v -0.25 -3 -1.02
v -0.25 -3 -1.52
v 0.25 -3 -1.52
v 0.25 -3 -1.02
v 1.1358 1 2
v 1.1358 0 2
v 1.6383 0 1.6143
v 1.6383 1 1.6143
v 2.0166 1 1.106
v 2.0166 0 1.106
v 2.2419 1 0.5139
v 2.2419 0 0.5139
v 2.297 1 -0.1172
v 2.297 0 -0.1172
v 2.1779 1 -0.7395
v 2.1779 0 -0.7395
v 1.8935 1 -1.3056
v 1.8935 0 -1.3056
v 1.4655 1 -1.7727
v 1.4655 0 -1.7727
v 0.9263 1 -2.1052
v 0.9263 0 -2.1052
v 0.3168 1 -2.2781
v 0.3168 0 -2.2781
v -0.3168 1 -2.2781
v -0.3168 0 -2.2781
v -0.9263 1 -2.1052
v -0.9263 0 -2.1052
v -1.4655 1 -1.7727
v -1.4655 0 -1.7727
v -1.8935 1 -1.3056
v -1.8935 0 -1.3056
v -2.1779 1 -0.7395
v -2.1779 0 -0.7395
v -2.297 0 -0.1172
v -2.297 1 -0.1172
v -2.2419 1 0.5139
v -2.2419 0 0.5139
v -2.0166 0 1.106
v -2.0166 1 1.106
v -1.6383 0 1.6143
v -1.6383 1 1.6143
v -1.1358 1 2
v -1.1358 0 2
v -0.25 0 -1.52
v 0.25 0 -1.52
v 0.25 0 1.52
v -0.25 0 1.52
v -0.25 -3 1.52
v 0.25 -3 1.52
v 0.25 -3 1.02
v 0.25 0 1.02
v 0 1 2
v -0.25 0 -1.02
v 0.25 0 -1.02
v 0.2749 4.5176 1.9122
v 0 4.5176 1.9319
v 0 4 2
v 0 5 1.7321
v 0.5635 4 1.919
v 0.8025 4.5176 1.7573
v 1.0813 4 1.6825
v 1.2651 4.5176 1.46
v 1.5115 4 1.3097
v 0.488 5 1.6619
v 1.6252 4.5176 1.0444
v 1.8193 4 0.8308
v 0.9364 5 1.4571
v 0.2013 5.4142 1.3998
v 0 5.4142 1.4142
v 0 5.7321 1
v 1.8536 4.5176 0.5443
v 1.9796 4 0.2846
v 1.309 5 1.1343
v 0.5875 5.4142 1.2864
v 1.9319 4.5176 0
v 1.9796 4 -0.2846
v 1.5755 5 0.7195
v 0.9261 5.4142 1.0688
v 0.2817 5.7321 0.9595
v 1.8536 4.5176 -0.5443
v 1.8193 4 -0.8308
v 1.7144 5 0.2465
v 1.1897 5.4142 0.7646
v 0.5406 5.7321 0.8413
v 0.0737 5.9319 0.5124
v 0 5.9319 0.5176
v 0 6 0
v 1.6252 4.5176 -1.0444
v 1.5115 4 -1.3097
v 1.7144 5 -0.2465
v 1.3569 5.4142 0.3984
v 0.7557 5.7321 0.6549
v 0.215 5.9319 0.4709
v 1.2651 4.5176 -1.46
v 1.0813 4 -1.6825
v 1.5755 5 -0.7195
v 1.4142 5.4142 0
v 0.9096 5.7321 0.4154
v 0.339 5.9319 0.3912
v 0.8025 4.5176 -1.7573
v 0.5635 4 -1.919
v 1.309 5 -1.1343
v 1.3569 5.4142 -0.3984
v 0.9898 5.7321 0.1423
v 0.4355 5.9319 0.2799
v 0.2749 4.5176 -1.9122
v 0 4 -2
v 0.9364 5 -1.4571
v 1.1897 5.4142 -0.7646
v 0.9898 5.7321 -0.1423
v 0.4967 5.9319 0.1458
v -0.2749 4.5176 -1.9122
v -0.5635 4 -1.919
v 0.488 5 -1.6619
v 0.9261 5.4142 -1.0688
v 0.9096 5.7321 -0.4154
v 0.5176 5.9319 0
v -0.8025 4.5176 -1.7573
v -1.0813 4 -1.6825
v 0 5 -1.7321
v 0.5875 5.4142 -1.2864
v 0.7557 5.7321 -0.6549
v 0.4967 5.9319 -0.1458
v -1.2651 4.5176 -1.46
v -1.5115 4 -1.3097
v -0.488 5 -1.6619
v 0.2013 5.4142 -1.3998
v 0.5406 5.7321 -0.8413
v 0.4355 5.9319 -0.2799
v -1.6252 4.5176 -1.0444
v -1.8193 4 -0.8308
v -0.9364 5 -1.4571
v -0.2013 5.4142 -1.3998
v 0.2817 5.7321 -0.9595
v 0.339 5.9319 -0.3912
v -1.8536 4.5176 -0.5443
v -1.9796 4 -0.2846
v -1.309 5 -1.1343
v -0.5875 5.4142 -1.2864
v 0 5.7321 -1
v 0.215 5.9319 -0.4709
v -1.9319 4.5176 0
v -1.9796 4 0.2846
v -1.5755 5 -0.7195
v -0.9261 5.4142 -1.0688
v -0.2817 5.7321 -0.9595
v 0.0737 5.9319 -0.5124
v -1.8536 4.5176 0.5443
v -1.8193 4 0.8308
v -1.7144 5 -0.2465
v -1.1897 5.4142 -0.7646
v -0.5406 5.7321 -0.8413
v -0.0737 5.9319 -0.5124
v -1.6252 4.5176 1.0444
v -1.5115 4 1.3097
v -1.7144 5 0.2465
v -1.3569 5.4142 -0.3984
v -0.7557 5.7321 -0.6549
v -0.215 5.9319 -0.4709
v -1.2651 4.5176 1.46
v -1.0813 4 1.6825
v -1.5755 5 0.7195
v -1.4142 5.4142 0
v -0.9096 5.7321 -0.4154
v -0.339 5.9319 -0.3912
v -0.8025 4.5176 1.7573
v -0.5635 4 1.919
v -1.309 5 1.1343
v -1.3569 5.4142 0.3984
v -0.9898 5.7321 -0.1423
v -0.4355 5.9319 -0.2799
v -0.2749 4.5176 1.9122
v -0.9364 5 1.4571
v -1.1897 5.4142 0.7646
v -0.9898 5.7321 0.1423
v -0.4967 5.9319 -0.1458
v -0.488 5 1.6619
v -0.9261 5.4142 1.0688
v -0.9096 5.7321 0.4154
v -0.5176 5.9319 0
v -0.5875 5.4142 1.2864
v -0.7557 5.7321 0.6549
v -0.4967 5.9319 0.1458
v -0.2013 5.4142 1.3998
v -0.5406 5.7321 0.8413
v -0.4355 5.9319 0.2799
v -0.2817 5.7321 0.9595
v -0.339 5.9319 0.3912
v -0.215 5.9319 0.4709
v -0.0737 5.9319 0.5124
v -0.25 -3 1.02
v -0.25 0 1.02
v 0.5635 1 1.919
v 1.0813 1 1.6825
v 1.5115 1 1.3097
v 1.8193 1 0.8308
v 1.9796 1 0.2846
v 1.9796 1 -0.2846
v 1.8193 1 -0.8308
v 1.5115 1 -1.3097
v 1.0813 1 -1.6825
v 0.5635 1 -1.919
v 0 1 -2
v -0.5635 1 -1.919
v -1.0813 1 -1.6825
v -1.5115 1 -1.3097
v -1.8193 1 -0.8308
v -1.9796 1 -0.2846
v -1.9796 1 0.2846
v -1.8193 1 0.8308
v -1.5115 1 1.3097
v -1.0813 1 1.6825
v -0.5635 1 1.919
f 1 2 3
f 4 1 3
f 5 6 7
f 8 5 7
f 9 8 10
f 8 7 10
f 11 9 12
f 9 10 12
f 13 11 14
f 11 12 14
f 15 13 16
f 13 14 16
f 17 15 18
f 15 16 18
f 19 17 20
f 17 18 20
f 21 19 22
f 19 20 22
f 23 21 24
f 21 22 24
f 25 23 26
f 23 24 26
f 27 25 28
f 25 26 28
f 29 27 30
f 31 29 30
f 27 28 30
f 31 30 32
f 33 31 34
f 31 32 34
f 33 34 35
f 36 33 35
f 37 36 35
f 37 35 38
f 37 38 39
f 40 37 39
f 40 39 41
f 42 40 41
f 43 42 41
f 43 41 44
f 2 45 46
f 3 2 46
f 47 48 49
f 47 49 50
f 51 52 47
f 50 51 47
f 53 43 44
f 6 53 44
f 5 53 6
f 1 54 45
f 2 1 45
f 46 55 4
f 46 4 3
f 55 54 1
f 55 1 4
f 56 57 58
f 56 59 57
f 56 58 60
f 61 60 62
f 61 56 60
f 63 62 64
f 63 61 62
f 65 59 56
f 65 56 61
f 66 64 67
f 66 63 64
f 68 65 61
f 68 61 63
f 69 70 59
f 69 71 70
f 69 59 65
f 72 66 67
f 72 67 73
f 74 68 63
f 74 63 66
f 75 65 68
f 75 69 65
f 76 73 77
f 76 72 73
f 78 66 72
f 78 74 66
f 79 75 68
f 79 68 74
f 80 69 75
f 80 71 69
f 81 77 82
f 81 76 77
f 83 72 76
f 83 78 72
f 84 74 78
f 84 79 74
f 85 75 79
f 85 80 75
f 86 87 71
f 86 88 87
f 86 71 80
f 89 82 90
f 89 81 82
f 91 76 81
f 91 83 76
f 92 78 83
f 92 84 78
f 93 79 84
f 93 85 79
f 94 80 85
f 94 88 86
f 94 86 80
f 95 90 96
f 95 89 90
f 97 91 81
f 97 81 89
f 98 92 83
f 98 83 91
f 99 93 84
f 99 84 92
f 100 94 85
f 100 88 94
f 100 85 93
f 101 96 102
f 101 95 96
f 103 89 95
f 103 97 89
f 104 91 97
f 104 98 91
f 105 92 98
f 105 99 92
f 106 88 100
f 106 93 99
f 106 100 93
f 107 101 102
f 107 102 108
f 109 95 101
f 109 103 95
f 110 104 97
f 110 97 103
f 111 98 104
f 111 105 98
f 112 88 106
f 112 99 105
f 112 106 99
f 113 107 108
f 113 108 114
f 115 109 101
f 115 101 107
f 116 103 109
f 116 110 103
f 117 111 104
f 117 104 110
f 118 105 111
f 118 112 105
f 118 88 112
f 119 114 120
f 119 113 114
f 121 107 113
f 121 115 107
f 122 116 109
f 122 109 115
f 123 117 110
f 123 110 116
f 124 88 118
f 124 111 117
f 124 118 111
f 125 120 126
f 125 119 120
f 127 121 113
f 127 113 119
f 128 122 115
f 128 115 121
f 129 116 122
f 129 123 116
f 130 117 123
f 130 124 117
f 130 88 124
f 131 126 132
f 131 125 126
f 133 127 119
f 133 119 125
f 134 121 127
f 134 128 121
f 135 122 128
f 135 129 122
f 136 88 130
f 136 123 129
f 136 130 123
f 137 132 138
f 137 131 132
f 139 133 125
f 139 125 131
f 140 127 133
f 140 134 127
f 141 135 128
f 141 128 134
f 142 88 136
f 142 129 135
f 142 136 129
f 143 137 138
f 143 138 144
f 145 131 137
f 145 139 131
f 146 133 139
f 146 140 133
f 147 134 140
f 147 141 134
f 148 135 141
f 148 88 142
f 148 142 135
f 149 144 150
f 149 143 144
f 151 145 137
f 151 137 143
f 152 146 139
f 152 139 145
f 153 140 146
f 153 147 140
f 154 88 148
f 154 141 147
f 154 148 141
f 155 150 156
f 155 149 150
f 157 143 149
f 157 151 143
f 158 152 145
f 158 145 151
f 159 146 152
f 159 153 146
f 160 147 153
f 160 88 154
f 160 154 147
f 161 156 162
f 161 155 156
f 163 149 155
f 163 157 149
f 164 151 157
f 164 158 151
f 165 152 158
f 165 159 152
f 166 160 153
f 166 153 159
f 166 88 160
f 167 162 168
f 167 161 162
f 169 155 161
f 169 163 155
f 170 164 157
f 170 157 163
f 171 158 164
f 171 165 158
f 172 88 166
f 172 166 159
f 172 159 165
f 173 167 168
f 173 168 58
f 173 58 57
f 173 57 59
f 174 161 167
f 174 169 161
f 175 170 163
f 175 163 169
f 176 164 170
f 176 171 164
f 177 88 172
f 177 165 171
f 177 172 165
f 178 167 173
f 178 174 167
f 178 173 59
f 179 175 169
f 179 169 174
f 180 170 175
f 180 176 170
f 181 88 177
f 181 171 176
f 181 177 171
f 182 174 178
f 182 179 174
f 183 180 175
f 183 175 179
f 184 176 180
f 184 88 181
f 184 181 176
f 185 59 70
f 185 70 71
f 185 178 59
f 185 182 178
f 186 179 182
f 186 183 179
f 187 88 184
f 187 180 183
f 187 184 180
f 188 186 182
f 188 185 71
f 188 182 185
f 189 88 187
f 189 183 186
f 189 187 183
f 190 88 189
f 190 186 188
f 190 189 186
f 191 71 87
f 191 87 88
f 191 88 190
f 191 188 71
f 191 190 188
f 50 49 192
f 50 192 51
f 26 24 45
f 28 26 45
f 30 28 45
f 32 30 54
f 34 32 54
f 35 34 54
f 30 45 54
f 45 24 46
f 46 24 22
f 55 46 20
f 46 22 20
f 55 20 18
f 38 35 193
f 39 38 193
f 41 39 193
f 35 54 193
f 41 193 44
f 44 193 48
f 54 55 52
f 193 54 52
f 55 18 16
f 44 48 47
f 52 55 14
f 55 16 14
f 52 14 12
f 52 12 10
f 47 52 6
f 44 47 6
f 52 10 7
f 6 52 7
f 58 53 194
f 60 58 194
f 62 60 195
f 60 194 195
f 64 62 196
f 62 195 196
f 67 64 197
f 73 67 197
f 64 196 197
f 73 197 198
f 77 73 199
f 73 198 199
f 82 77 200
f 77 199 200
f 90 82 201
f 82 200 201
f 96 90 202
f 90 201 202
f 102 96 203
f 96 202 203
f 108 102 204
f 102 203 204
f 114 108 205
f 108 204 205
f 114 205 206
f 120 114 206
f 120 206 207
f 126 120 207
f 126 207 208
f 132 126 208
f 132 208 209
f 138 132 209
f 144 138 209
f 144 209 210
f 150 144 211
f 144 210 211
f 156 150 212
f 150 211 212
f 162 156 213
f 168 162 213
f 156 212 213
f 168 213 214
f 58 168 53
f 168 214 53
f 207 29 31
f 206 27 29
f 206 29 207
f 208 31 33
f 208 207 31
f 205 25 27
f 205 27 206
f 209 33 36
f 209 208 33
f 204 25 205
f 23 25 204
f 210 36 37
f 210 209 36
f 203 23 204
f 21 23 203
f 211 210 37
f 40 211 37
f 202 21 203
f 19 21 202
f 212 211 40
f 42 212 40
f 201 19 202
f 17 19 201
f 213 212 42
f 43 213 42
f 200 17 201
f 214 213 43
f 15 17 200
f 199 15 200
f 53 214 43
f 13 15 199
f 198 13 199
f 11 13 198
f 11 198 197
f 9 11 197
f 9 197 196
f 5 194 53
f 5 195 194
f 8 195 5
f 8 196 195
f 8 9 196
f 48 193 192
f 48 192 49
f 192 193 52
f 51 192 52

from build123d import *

# Parameters (mm, degrees)
SKETCH_1_R          = 2.3
EXTRUDE_1_DEPTH     = 1
SKETCH_2_R          = 2
EXTRUDE_2_DEPTH     = 5
SKETCH_3_W          = 0.5
SKETCH_3_H          = 0.5
EXTRUDE_3_DEPTH     = 3
SKETCH_4_W          = 9.434244616
SKETCH_4_H          = 19.451997256
CUT_EXTRUDE_1_DEPTH = 3
FILLET_1_R          = 2


with BuildPart() as part:
    # Эскиз1 → Бобышка-Вытянуть1 (new body)
    with BuildSketch(Plane(origin=(0, 0, 0), x_dir=(1, 0, 0), z_dir=(0, 1, 0))):
        with Locations(Location((0, 0, 0), (0, 0, 270))):
            Circle(SKETCH_1_R)
    extrude(amount=EXTRUDE_1_DEPTH)

    # Эскиз2 → Бобышка-Вытянуть2 (add)
    with BuildSketch(Plane(origin=(0, 1, 0), x_dir=(1, 0, 0), z_dir=(0, 1, 0))):
        with Locations(Location((0, 0, 0), (0, 0, 270))):
            Circle(SKETCH_2_R)
    extrude(amount=EXTRUDE_2_DEPTH)

    # Эскиз3 → Бобышка-Вытянуть3 (add)
    with BuildSketch(Plane.XZ):
        with Locations((0, 1.27)):
            Rectangle(SKETCH_3_W, SKETCH_3_H)
    extrude_3 = extrude(amount=EXTRUDE_3_DEPTH)

    # Зеркальное отражение1: Бобышка-Вытянуть3 across plane
    add(extrude_3.mirror(Plane(origin=(0, 0, 0), x_dir=(1, 0, 0), z_dir=(0, 0, -1))))

    # Эскиз4 → Вырез-Вытянуть1 (cut)
    with BuildSketch(Plane.XY.offset(2)):
        Rectangle(SKETCH_4_W, SKETCH_4_H)
    extrude(amount=CUT_EXTRUDE_1_DEPTH, mode=Mode.SUBTRACT)

    # Скругление1
    fillet_1_edges = [part.edges().sort_by_distance(p)[0] for p in [
        (0, 6, -2),
    ]]
    fillet(fillet_1_edges, radius=FILLET_1_R)


solid = part.part
